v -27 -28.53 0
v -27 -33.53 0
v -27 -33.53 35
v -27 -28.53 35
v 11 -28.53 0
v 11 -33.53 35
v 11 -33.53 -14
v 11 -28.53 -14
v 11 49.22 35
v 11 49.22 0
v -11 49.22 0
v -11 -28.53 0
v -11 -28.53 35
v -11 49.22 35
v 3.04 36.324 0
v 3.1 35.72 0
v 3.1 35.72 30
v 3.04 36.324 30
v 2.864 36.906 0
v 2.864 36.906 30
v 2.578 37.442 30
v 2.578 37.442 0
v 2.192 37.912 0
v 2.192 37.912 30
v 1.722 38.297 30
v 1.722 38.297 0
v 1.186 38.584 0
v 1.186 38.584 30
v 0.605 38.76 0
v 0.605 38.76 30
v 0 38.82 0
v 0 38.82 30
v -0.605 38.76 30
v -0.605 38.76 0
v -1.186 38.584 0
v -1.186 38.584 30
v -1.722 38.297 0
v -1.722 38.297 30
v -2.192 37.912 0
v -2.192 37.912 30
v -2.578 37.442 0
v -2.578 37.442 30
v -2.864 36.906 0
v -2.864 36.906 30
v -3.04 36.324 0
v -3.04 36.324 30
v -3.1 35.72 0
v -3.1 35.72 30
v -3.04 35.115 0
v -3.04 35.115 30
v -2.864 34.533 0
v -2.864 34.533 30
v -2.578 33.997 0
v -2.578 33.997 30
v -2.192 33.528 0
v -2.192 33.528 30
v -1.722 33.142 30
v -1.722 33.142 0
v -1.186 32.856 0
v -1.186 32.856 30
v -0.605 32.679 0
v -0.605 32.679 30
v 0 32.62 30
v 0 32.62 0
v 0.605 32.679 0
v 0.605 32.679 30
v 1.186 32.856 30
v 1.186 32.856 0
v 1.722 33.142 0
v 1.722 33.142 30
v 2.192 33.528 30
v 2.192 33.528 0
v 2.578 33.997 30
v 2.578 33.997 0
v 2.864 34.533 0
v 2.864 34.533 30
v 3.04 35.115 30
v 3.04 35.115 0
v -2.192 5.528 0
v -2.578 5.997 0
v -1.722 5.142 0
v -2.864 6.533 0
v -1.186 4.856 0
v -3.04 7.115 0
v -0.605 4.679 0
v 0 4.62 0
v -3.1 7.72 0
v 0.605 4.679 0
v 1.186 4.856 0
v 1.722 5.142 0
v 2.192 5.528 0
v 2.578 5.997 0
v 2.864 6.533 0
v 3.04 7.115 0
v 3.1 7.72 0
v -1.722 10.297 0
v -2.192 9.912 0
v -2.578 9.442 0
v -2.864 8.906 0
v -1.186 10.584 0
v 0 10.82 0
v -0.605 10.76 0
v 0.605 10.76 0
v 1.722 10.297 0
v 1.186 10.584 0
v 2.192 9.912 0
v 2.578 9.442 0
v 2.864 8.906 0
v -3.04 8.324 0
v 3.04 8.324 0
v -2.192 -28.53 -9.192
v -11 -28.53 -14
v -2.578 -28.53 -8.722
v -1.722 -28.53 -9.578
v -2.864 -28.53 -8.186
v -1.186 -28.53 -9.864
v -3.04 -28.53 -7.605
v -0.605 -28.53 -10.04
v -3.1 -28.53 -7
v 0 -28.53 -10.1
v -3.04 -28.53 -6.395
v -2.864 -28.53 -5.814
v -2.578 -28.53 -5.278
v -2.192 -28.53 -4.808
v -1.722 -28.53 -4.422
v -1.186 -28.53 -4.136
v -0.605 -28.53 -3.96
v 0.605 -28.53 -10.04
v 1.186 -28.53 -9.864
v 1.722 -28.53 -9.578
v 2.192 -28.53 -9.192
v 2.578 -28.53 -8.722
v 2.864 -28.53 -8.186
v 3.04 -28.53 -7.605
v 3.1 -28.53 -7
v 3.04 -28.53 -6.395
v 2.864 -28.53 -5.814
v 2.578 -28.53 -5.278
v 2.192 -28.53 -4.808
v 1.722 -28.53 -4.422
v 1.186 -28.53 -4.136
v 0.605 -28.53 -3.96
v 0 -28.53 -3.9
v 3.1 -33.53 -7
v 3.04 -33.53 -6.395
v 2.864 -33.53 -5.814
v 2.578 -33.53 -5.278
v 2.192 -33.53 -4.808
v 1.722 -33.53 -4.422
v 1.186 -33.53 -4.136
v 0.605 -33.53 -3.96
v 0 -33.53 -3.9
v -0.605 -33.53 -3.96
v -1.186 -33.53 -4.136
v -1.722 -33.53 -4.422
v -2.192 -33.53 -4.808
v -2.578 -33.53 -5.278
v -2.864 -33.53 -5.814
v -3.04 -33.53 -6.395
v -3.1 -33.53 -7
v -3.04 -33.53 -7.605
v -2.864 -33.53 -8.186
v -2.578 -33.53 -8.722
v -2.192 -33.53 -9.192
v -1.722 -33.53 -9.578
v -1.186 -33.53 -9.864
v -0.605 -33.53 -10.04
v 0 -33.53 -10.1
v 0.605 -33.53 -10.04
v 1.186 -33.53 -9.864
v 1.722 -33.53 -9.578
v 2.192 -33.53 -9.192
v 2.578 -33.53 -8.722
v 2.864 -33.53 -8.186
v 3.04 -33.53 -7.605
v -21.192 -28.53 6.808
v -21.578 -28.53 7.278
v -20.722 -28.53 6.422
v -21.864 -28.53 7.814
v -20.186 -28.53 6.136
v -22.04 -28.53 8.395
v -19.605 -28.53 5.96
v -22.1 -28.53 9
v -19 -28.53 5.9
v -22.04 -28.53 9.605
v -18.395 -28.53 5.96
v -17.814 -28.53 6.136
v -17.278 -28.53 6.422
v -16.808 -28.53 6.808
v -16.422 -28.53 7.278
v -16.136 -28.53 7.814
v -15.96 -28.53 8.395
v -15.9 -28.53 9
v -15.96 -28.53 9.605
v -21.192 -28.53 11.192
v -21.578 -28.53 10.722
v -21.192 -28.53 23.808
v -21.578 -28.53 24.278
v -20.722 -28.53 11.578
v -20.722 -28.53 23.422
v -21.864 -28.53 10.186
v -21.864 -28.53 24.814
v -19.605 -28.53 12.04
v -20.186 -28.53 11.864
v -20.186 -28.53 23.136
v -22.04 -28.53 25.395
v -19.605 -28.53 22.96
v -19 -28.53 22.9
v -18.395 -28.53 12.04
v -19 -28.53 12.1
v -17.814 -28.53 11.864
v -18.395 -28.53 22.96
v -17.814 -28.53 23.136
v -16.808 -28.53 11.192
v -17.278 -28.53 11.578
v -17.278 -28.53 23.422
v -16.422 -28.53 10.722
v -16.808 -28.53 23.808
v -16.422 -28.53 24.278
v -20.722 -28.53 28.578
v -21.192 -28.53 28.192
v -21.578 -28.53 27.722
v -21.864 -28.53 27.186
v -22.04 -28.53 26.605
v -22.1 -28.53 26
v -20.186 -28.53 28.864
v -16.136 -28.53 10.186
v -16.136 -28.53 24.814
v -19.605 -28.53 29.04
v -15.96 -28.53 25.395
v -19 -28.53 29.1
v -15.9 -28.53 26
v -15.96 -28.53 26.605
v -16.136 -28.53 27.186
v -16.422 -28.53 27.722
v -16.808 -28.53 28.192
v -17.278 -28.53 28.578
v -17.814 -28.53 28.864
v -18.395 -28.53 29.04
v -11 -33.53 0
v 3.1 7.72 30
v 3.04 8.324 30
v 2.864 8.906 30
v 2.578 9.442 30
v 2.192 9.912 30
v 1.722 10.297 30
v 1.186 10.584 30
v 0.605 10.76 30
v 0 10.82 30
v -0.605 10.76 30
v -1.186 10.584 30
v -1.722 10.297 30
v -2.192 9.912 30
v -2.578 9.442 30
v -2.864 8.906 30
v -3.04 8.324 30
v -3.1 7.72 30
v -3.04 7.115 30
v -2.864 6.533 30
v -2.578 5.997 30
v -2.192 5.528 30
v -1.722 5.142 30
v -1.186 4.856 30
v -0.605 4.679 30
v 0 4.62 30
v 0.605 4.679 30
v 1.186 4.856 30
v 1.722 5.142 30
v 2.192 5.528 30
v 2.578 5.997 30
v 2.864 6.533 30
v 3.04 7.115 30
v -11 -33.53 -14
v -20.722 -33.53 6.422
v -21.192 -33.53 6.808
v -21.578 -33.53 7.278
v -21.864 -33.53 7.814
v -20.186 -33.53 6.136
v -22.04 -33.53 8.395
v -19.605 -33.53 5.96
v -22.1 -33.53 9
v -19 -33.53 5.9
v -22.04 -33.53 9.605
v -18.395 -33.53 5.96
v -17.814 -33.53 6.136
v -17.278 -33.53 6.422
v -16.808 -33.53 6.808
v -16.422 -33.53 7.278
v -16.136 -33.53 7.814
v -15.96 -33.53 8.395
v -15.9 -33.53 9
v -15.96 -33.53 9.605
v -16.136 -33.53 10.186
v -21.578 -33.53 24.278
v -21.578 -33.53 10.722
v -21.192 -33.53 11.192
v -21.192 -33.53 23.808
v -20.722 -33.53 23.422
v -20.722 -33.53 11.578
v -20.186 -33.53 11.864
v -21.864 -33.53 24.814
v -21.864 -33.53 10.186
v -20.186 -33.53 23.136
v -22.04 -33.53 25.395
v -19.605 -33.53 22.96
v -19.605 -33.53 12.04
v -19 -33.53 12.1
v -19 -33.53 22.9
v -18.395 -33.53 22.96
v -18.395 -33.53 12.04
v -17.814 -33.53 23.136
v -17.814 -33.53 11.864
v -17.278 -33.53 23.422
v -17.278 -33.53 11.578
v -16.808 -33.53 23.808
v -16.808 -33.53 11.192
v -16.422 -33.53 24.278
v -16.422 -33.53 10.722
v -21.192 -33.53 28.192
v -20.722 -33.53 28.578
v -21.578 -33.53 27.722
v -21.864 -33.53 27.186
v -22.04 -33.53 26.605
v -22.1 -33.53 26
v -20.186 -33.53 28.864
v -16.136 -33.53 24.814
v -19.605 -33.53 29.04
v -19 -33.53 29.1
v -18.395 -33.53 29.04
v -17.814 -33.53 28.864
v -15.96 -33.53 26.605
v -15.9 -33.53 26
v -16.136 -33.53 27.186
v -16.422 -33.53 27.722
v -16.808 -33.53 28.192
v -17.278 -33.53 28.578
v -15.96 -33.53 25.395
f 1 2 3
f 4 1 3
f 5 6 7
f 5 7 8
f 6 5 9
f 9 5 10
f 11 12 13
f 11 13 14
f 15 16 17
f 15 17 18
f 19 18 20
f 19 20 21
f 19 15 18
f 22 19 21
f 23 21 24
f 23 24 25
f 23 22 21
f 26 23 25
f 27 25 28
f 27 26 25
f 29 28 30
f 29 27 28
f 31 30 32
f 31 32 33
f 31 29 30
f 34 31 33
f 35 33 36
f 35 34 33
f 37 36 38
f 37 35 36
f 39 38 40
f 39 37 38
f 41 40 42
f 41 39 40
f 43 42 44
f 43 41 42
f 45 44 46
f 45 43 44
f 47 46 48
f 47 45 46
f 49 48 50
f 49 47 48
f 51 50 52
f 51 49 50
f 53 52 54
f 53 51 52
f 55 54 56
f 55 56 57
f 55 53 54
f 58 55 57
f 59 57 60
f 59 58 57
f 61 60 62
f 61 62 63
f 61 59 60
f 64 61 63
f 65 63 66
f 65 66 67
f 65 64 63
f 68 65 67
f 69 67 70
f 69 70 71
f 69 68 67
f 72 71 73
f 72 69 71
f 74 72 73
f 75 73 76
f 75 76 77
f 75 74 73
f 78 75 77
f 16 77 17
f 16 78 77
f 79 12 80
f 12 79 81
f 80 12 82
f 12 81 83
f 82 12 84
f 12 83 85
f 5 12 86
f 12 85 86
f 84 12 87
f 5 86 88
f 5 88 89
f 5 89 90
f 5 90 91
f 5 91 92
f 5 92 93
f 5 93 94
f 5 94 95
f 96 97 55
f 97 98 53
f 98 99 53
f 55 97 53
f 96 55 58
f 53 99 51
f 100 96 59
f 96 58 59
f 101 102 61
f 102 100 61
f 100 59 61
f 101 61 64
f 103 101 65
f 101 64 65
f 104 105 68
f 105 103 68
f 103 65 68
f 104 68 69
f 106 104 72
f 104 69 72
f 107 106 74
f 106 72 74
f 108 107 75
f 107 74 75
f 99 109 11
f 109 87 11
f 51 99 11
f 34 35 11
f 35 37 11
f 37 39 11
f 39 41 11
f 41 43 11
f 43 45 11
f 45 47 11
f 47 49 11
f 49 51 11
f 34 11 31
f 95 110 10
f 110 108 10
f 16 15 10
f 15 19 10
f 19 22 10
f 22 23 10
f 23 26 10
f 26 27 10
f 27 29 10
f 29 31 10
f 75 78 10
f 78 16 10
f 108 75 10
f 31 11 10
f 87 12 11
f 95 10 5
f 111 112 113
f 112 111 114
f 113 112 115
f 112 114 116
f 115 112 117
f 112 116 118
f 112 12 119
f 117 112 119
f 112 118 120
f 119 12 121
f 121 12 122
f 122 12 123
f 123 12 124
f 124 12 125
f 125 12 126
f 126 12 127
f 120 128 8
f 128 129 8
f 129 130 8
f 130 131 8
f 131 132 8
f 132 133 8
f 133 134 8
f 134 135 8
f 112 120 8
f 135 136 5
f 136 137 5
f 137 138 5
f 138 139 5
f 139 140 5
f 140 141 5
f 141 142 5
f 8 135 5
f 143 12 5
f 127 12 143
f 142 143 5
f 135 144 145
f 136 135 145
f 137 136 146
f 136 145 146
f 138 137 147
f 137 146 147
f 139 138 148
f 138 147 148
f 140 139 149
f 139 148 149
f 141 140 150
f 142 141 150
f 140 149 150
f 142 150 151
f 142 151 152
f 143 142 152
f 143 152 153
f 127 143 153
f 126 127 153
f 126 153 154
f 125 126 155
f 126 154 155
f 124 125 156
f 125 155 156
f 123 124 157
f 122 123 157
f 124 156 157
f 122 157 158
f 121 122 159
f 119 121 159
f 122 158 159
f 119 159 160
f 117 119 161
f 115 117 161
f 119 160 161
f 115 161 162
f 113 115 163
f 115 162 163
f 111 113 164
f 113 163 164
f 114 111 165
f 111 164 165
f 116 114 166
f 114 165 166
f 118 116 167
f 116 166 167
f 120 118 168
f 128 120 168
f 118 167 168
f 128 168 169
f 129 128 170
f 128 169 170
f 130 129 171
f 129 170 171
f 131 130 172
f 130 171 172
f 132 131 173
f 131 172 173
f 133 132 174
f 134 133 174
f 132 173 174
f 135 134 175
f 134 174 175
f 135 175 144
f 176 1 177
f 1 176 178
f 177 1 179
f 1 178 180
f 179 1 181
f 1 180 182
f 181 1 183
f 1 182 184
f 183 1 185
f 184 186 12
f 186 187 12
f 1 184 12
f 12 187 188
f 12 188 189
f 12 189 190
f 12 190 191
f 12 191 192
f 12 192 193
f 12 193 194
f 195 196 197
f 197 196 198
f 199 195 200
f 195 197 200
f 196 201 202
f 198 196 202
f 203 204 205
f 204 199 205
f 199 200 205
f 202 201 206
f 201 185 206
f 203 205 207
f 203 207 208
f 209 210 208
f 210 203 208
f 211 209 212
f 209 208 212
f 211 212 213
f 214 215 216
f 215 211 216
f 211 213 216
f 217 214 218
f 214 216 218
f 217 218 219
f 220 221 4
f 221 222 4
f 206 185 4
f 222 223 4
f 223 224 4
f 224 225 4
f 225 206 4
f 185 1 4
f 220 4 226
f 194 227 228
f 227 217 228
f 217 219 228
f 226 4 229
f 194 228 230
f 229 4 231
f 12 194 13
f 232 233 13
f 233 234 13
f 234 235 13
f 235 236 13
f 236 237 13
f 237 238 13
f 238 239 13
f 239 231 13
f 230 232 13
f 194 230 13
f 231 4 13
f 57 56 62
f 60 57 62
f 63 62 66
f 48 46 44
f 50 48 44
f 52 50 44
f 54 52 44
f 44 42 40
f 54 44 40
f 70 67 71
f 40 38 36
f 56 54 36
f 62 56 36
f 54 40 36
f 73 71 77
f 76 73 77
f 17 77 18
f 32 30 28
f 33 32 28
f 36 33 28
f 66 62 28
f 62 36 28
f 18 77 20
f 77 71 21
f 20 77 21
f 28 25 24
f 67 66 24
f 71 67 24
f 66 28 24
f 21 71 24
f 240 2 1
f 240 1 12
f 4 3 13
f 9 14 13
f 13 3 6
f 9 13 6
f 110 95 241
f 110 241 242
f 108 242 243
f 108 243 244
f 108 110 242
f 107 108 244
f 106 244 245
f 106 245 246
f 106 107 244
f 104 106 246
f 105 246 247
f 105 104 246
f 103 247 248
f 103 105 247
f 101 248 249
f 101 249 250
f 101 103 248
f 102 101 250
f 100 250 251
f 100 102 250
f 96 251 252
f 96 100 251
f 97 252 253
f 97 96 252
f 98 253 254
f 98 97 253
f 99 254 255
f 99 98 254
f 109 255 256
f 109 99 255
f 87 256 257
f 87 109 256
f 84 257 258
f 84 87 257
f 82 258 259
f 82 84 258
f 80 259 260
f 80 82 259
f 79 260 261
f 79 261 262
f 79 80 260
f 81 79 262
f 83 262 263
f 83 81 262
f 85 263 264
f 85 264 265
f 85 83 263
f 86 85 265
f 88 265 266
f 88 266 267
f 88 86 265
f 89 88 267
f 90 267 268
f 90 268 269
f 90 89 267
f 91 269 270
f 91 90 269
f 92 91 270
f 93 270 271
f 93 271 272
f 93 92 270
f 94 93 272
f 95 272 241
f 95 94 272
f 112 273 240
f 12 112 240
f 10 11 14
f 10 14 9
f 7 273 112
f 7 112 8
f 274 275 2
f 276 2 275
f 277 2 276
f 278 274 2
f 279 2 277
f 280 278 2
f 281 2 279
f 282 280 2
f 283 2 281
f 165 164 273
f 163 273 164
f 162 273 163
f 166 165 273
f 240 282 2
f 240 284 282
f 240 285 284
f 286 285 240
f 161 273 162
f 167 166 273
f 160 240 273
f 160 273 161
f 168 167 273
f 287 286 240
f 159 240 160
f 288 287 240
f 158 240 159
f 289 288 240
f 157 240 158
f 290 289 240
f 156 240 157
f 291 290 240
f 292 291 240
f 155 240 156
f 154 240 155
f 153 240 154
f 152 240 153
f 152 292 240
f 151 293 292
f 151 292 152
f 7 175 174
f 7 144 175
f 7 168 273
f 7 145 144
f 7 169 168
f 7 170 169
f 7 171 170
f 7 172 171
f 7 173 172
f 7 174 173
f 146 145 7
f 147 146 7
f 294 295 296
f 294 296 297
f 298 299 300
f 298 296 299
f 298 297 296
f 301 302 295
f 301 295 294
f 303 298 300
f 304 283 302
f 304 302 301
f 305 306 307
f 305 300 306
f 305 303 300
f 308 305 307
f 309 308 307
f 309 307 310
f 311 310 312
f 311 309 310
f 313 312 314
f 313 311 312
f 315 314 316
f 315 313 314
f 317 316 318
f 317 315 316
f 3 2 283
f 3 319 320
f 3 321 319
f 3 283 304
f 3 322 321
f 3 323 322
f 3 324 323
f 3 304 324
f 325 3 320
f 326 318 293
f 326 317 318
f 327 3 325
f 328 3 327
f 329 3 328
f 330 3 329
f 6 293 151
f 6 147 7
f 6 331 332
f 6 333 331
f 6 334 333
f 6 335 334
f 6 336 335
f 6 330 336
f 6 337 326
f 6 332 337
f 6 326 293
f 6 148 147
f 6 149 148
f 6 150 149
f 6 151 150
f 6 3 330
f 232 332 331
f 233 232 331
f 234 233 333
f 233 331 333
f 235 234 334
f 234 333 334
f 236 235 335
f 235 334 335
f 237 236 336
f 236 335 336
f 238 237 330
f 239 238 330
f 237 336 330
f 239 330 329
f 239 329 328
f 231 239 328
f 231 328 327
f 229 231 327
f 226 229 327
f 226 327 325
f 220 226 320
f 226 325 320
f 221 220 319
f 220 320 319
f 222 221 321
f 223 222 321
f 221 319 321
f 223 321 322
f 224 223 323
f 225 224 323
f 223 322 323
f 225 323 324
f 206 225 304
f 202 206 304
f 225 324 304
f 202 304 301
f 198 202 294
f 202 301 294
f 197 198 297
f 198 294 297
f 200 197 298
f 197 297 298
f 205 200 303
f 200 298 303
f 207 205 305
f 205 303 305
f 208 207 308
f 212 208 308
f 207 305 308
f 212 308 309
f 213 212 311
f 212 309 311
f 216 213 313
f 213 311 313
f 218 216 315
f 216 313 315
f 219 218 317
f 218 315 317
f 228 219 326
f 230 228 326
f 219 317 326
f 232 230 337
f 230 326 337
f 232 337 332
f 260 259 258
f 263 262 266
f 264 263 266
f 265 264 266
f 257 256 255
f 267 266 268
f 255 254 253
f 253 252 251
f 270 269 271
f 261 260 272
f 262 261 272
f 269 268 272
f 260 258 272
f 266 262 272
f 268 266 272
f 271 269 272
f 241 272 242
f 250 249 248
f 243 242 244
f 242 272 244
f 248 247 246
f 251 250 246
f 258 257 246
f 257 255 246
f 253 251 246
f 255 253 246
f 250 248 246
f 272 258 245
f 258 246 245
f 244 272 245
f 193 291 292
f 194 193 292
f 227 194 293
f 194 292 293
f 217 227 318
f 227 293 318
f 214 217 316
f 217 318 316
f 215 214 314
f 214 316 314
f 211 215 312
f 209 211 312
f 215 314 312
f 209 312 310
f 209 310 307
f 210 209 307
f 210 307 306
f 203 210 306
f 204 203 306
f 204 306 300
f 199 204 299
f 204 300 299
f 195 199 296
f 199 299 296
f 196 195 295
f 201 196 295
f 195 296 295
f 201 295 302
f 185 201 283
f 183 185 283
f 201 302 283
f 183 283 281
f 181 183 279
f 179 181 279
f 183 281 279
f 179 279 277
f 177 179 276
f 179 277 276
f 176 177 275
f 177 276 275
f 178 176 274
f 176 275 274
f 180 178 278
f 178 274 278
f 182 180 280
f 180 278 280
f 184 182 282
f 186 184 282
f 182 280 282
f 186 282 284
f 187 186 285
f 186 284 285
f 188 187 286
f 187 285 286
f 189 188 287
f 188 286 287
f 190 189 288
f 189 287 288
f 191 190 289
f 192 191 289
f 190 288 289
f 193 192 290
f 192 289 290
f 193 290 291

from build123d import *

# Parameters (mm, degrees)
SKETCH1_W           = 22
SKETCH1_H           = 82.75
SKETCH1_R           = 3.1
BOSS_EXTRUDE1_DEPTH = 30
SKETCH2_W           = 22
SKETCH2_H           = 82.75
BOSS_EXTRUDE2_DEPTH = 5
SKETCH3_W           = 16
SKETCH3_H           = 35
SKETCH3_R           = 3.1
SKETCH3_W_2         = 22
SKETCH3_H_2         = 14
BOSS_EXTRUDE3_DEPTH = 5


with BuildPart() as part:
    # Sketch1 → Boss-Extrude1 (new body)
    with BuildSketch(Plane.XY):
        with Locations((0, 7.844654309)):
            Rectangle(SKETCH1_W, SKETCH1_H)
        with Locations((0, 35.719654309)):
            Circle(SKETCH1_R, mode=Mode.SUBTRACT)
        with Locations((0, 7.719654309)):
            Circle(SKETCH1_R, mode=Mode.SUBTRACT)
    extrude(amount=BOSS_EXTRUDE1_DEPTH)

    # Sketch2 → Boss-Extrude2 (add)
    with BuildSketch(Plane.XY.offset(30)):
        with Locations((0, 7.844654309)):
            Rectangle(SKETCH2_W, SKETCH2_H)
    extrude(amount=BOSS_EXTRUDE2_DEPTH)

    # Sketch3 → Boss-Extrude3 (add)
    with BuildSketch(Plane.XZ.offset(33.530345691)):
        with Locations((-19, 17.5)):
            Rectangle(SKETCH3_W, SKETCH3_H)
        with Locations((-19, 26)):
            Circle(SKETCH3_R, mode=Mode.SUBTRACT)
        with Locations((-19, 9)):
            Circle(SKETCH3_R, mode=Mode.SUBTRACT)
        with Locations((0, -7)):
            Rectangle(SKETCH3_W_2, SKETCH3_H_2)
        with Locations((0, -7)):
            Circle(SKETCH3_R, mode=Mode.SUBTRACT)
    extrude(amount=-BOSS_EXTRUDE3_DEPTH)


solid = part.part
